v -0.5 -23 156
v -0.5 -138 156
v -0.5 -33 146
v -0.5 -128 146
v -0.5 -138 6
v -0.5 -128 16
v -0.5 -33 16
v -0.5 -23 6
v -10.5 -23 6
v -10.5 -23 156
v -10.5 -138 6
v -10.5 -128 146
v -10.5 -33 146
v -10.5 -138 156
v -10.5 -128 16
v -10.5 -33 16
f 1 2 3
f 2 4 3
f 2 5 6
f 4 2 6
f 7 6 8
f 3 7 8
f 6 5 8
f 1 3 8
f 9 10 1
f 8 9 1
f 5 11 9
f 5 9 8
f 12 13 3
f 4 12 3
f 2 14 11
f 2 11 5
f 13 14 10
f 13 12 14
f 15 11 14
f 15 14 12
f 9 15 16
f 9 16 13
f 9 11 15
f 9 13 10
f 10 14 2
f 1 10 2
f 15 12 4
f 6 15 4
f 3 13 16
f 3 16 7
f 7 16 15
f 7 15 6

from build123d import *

# Parameters (mm, degrees)
BOX049_W     = 10
BOX049_H     = 10
BOX049_DEPTH = 130
BOX050_W     = 10
BOX050_H     = 115
BOX050_DEPTH = 10
BOX051_W     = 10
BOX051_H     = 115
BOX051_DEPTH = 10
BOX048_W     = 10
BOX048_H     = 10
BOX048_DEPTH = 130


with BuildPart() as cubo012:
    # Box049 → Box049 (new body)
    with BuildSketch(Plane(origin=(-37, 115, 15), x_dir=(1, 0, 0), z_dir=(0, 0, 1))):
        with Locations((5, 5)):
            Rectangle(BOX049_W, BOX049_H)
    extrude(amount=BOX049_DEPTH)


with BuildPart() as cubo013:
    # Box050 → Box050 (new body)
    with BuildSketch(Plane(origin=(-37, 115, 145), x_dir=(1, 0, 0), z_dir=(0, 0, 1))):
        with Locations((5, 57.5)):
            Rectangle(BOX050_W, BOX050_H)
    extrude(amount=BOX050_DEPTH)


with BuildPart() as cubo014:
    # Box051 → Box051 (new body)
    with BuildSketch(Plane(origin=(-37, 115, 5), x_dir=(1, 0, 0), z_dir=(0, 0, 1))):
        with Locations((5, 57.5)):
            Rectangle(BOX051_W, BOX051_H)
    extrude(amount=BOX051_DEPTH)


with BuildPart() as fusion007:
    # Box048 → Box048 (new body)
    with BuildSketch(Plane(origin=(-37, 220, 15), x_dir=(1, 0, 0), z_dir=(0, 0, 1))):
        with Locations((5, 5)):
            Rectangle(BOX048_W, BOX048_H)
    extrude(amount=BOX048_DEPTH)

    # Fusion007: union Cubo012, Cubo013, Cubo014
    add(cubo012.part)
    add(cubo013.part)
    add(cubo014.part)


with BuildPart() as fusion007_1:
    # Fusion007 placement: moved
    add(fusion007.part.moved(Location((26.5, -253, 1))))


solid = fusion007_1.part
